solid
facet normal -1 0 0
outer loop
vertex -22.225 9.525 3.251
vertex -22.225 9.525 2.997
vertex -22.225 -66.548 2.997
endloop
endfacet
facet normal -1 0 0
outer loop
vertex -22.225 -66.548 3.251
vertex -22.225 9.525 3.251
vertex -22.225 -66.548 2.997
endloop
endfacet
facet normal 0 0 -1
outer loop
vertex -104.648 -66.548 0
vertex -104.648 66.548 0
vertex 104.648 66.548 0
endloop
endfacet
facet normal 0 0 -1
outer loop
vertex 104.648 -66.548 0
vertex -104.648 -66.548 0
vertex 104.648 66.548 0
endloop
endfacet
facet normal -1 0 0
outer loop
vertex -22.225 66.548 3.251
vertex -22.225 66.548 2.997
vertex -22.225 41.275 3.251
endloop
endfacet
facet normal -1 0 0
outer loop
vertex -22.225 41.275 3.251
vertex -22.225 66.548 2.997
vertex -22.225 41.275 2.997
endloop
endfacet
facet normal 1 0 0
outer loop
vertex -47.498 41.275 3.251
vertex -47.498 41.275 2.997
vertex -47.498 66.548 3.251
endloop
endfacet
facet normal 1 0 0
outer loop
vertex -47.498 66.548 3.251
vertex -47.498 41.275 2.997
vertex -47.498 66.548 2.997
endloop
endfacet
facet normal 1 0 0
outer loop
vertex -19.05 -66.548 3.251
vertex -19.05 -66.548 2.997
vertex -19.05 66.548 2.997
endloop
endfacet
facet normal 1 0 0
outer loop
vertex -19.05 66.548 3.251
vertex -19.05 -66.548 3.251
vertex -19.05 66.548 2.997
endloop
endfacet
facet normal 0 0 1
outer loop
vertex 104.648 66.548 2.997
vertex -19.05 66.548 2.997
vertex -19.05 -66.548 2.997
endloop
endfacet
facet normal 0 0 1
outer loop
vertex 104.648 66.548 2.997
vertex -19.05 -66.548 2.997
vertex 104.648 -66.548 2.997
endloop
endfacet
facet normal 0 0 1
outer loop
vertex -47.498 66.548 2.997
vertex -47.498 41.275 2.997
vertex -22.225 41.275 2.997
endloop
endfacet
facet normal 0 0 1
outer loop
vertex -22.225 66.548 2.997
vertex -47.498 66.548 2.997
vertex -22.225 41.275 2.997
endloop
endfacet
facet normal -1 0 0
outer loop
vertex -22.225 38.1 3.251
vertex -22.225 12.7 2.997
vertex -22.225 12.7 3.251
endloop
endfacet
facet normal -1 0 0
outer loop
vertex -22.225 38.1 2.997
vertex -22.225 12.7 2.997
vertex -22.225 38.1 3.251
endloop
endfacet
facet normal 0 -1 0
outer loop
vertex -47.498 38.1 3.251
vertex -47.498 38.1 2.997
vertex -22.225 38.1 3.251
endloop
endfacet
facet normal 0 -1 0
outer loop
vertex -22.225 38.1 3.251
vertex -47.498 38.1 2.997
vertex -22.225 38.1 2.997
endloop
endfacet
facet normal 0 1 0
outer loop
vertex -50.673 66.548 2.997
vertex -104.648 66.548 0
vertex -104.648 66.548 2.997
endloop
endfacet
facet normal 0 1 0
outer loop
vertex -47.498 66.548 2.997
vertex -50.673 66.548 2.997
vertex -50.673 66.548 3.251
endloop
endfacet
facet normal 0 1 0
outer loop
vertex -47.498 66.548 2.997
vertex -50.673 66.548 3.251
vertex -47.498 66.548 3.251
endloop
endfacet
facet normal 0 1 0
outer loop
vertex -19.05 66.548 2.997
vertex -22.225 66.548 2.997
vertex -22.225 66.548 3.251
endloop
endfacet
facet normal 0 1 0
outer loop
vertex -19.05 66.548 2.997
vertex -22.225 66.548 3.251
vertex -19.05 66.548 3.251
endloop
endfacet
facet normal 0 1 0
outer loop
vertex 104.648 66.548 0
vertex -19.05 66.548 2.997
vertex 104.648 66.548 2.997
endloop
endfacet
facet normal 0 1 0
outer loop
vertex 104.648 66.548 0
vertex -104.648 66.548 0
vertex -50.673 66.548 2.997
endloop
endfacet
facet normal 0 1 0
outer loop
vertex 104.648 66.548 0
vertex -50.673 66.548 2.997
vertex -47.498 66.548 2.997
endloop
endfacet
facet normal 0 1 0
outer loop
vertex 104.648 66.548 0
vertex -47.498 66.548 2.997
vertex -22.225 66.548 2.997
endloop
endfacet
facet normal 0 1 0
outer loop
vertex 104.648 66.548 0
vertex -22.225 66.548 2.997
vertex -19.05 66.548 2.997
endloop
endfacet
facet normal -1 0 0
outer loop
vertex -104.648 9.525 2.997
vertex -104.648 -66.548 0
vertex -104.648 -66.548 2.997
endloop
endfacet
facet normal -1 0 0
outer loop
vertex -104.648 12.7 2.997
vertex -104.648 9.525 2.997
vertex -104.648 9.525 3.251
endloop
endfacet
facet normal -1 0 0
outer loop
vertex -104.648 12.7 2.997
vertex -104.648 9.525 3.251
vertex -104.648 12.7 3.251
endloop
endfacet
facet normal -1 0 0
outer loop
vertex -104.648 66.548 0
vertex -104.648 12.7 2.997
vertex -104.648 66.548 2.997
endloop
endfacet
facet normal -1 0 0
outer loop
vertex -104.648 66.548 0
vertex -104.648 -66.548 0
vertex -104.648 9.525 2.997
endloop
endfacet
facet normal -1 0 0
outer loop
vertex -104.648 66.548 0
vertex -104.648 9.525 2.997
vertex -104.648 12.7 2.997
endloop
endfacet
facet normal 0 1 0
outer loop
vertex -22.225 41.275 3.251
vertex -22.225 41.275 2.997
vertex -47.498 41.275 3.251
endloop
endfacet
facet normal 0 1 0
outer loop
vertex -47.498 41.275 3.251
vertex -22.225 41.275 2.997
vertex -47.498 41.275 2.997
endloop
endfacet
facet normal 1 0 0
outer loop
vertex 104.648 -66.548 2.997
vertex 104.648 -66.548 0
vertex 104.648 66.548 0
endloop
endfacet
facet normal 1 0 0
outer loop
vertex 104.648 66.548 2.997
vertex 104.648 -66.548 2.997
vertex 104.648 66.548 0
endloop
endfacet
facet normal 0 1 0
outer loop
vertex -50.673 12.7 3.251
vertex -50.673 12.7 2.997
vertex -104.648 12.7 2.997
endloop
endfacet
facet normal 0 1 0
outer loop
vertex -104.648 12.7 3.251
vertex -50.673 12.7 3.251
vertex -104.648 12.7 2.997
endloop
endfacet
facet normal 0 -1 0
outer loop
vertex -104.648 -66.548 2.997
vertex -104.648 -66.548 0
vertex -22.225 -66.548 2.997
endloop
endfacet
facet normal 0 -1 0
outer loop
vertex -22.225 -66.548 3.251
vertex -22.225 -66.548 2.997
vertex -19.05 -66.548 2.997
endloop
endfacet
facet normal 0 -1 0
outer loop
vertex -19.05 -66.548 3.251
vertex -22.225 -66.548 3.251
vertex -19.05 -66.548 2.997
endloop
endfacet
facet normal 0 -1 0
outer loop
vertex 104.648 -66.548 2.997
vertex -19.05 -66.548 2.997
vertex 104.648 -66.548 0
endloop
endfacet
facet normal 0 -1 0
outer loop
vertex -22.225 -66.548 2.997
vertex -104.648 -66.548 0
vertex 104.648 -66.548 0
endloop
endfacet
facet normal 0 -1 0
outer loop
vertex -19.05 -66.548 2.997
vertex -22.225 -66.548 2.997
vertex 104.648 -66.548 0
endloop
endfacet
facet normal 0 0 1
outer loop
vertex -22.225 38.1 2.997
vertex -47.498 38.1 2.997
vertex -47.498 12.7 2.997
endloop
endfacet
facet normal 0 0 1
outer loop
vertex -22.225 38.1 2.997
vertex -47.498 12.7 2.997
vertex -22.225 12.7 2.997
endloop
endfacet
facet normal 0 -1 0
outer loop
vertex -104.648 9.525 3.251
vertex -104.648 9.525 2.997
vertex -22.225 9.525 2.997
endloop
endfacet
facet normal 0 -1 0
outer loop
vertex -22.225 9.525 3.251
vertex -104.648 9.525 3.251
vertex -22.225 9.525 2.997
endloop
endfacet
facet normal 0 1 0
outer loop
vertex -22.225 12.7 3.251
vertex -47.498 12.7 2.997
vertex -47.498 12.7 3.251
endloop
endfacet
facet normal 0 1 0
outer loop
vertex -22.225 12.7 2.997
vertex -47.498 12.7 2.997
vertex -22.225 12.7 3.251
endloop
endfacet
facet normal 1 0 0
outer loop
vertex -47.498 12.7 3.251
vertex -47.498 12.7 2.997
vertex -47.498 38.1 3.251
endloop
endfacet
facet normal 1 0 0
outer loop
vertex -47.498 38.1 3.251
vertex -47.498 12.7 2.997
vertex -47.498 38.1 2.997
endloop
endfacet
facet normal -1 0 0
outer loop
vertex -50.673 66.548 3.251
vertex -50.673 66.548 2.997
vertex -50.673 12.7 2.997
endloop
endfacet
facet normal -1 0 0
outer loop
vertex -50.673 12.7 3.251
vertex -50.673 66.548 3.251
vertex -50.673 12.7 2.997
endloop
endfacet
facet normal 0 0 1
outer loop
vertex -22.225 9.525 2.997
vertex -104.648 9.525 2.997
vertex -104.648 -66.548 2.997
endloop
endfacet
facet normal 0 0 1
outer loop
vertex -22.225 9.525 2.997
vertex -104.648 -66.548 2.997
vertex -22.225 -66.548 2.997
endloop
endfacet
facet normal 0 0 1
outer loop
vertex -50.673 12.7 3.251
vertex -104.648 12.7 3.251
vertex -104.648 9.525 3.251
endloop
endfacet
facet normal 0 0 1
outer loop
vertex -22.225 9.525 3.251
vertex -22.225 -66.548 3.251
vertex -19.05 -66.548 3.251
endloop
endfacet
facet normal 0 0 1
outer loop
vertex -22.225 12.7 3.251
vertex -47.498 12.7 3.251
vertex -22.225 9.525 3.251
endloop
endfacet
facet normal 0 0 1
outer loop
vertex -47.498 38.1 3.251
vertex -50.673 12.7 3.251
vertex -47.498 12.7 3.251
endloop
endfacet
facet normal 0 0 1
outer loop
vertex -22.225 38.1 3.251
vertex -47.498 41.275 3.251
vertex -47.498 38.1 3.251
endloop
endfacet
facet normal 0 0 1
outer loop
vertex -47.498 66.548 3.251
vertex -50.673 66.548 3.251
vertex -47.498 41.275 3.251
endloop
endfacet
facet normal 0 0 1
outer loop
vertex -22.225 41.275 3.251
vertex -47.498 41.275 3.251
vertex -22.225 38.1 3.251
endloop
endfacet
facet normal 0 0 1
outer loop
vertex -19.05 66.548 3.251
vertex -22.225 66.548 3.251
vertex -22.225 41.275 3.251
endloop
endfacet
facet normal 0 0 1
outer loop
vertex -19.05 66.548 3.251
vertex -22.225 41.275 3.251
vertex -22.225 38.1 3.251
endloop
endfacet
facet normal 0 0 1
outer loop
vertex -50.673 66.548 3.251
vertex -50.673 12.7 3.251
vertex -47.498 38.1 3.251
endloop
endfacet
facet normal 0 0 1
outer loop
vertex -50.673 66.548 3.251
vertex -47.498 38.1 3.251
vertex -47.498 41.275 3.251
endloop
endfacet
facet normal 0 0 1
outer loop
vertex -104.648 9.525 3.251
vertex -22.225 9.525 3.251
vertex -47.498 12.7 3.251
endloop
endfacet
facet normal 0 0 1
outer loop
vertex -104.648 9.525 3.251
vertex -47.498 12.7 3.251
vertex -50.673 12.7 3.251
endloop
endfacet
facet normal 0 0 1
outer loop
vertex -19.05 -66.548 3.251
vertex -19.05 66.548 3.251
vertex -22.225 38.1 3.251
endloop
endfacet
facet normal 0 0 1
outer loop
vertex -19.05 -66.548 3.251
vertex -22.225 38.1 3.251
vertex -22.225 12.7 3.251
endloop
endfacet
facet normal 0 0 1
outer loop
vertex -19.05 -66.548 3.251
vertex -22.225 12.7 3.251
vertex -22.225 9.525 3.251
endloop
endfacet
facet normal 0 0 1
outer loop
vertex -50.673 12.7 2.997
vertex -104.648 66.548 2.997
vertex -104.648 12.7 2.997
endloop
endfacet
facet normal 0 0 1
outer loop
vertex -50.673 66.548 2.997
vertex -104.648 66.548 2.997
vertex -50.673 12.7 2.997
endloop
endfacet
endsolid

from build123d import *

# Parameters (mm, degrees)
F0_W     = 209.296
F0_H     = 133.096
F1_DEPTH = 2.9972
F2_W     = 25.273
F2_H     = 25.4
F3_DEPTH = 0.254


with BuildPart() as f1:
    # F0 (on Top) → F1 (new body)
    with BuildSketch(Plane.XY):
        Rectangle(F0_W, F0_H)
    extrude(amount=F1_DEPTH)

    # F2 (on face) → F3 (join)
    with BuildSketch(Plane.XY.offset(2.9972)):
        Polygon((-47.498, 66.548), (-50.673, 66.548), (-50.673, 12.7), (-104.648, 12.7), (-104.648, 9.525), (-22.225, 9.525), (-22.225, -66.548), (-19.05, -66.548), (-19.05, 66.548), (-22.225, 66.548), (-22.225, 41.275), (-47.498, 41.275), align=None)
        with Locations((-34.8615, 25.4)):
            Rectangle(F2_W, F2_H, mode=Mode.SUBTRACT)
    extrude(amount=F3_DEPTH)


solid = f1.part
